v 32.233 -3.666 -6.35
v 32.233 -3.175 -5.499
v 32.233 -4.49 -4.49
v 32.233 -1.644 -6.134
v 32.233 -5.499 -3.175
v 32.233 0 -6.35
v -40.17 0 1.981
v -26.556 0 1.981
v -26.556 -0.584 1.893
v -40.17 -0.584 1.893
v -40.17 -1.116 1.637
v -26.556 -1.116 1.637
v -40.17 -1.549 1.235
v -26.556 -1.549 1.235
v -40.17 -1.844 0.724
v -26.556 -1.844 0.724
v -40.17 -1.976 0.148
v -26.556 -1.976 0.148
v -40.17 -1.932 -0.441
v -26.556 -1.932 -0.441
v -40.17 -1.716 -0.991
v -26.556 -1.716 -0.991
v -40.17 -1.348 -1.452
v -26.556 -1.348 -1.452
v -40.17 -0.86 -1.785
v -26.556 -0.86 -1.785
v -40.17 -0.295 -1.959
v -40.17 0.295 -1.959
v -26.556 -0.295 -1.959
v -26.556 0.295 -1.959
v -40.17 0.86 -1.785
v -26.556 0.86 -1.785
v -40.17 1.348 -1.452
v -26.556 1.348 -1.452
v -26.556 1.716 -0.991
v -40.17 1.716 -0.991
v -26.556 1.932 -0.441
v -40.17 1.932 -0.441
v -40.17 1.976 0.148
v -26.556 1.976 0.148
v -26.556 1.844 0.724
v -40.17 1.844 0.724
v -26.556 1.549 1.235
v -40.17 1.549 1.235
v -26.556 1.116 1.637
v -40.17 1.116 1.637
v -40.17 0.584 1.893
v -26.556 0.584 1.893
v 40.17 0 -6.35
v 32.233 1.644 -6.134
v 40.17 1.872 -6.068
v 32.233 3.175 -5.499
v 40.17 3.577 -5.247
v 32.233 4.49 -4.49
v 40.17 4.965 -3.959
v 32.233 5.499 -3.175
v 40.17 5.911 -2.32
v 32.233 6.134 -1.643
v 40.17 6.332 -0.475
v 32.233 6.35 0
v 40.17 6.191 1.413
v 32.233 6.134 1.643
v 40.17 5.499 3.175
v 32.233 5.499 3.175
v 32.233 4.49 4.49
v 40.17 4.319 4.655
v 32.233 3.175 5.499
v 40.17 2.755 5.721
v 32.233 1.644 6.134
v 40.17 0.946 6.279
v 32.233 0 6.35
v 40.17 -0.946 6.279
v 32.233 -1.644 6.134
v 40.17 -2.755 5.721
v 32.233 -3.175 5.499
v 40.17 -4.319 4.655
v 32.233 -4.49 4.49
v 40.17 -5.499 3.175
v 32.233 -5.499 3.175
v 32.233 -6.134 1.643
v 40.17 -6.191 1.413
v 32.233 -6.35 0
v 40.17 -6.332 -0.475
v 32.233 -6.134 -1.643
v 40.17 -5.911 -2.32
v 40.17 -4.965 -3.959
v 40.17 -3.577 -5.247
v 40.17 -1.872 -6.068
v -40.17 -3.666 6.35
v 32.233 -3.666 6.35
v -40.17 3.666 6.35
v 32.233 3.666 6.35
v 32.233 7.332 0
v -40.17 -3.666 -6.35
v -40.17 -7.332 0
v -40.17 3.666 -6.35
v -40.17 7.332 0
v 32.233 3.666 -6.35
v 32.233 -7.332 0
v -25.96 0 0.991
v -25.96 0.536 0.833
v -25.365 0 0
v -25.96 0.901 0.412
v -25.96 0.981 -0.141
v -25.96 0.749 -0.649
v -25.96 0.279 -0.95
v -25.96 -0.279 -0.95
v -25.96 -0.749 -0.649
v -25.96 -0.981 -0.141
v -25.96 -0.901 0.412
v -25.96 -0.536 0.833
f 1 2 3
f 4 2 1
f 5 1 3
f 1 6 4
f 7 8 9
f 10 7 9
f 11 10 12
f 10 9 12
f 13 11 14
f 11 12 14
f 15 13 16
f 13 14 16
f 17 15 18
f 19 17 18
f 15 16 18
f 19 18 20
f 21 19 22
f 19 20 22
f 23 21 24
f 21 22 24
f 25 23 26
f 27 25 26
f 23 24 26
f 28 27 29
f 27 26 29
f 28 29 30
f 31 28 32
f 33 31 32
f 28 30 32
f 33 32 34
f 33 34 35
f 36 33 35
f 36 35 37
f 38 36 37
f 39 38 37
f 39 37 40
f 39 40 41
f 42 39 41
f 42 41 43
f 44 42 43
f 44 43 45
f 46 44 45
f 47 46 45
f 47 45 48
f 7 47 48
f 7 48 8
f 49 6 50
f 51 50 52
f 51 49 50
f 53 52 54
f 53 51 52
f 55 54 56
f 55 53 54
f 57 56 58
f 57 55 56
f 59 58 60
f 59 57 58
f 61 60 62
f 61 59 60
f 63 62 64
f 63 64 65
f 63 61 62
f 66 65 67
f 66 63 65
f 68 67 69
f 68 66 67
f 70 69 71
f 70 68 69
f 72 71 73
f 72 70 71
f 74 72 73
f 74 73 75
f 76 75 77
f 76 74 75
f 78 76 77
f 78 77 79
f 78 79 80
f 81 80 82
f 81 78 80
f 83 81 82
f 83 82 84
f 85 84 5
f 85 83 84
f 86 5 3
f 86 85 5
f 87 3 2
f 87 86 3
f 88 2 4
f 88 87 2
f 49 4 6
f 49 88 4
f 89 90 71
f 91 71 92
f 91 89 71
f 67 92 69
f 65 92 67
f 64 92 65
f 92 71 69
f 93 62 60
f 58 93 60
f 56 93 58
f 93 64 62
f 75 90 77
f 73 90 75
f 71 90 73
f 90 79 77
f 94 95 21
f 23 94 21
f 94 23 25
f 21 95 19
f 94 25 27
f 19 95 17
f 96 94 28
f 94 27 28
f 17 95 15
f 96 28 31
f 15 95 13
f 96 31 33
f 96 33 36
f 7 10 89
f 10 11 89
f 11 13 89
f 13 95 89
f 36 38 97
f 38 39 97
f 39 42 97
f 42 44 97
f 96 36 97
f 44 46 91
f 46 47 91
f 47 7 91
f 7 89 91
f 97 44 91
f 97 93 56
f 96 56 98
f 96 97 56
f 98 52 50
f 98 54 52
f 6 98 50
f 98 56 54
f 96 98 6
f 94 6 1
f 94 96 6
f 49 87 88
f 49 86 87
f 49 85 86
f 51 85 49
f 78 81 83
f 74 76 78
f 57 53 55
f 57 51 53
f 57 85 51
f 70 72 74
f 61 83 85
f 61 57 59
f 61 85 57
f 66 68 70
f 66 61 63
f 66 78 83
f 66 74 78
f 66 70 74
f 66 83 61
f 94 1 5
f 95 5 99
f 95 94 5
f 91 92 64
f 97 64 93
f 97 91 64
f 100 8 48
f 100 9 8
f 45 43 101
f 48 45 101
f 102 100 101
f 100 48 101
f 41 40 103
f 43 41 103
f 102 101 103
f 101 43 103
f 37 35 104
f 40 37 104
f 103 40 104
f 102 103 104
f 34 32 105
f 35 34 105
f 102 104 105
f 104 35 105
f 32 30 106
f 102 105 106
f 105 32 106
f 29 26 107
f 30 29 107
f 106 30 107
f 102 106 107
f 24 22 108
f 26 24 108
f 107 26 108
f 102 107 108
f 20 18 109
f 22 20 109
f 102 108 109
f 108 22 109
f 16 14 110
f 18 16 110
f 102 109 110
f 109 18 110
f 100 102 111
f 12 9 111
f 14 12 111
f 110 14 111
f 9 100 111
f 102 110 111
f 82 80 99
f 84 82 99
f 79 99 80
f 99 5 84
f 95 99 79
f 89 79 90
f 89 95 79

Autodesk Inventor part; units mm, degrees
ref_plane "YZ Plane" through (0, 0, 0) normal (1, 0, 0) x (0, 1, 0)
ref_plane "XZ Plane" through (0, 0, 0) normal (0, 1, 0) x (-1, 0, 0)
ref_plane "XY Plane" through (0, 0, 0) normal (0, 0, 1) x (1, 0, 0)
sketch "Sketch1" plane through (0, 0, 0) normal (1, 0, 0) x (0, 1, 0)
  line L0 (3.6662, 6.35) -> (7.3323, 0)
  line L1 (7.3323, 0) -> (3.6662, -6.35)
  line L2 (3.6662, -6.35) -> (-3.6662, -6.35)
  line L3 (-3.6662, -6.35) -> (-7.3323, 0)
  line L4 (-7.3323, 0) -> (-3.6662, 6.35)
  line L5 (-3.6662, 6.35) -> (3.6662, 6.35)
  point P0 (0, 0)
  point P1 (0, 0)
  dimension "d0" = 12.7
extrude "Extrusion1" add sketch "Sketch1" along normal mid plane 80.3402
sketch "Sketch2" plane through (40.1701, 0, 0) normal (1, 0, 0) x (0, 0, -1)
  line L0 (-6.35, -3.6662) -> (0, -7.3323) projected
  line L1 (0, -7.3323) -> (6.35, -3.6662) projected
  line L2 (6.35, -3.6662) -> (6.35, 3.6662) projected
  line L3 (6.35, 3.6662) -> (0, 7.3323) projected
  line L4 (0, 7.3323) -> (-6.35, 3.6662) projected
  line L5 (-6.35, 3.6662) -> (-6.35, -3.6662) projected
  circle A0 centre (0, 0) radius 6.35
  point P0 (-3.175, 5.4993)
  point P1 (3.175, 5.4993)
  point P2 (6.35, 0)
  point P3 (3.175, -5.4993)
  point P4 (-3.175, -5.4993)
  point P5 (-6.35, 0)
  dimension "d3" = 12.7
extrude "Extrusion2" cut sketch "Sketch2" against normal blind 7.9375 contours L5 A0 L0 | A0 L1 L0 | L5 L4 A0 | A0 L2 L1 | L4 L3 A0 | A0 L3 L2
sketch "Sketch4" plane through (-40.1701, 0, 0) normal (-1, 0, 0) x (0, 0, 1)
  point P0 (0, 0)
  point P1 (0, 0)
hole "Hole1" at (-40.1701, 0, 0) direction (1, 0, 0) diameter 3.9624 depth 13.6144 tip angle 118 thread size "10-32 UNF" class "2B" standard "ANSI Unified Screw Threads"
properties part number "EL2-CGB-004" material "Aluminum 6061"
